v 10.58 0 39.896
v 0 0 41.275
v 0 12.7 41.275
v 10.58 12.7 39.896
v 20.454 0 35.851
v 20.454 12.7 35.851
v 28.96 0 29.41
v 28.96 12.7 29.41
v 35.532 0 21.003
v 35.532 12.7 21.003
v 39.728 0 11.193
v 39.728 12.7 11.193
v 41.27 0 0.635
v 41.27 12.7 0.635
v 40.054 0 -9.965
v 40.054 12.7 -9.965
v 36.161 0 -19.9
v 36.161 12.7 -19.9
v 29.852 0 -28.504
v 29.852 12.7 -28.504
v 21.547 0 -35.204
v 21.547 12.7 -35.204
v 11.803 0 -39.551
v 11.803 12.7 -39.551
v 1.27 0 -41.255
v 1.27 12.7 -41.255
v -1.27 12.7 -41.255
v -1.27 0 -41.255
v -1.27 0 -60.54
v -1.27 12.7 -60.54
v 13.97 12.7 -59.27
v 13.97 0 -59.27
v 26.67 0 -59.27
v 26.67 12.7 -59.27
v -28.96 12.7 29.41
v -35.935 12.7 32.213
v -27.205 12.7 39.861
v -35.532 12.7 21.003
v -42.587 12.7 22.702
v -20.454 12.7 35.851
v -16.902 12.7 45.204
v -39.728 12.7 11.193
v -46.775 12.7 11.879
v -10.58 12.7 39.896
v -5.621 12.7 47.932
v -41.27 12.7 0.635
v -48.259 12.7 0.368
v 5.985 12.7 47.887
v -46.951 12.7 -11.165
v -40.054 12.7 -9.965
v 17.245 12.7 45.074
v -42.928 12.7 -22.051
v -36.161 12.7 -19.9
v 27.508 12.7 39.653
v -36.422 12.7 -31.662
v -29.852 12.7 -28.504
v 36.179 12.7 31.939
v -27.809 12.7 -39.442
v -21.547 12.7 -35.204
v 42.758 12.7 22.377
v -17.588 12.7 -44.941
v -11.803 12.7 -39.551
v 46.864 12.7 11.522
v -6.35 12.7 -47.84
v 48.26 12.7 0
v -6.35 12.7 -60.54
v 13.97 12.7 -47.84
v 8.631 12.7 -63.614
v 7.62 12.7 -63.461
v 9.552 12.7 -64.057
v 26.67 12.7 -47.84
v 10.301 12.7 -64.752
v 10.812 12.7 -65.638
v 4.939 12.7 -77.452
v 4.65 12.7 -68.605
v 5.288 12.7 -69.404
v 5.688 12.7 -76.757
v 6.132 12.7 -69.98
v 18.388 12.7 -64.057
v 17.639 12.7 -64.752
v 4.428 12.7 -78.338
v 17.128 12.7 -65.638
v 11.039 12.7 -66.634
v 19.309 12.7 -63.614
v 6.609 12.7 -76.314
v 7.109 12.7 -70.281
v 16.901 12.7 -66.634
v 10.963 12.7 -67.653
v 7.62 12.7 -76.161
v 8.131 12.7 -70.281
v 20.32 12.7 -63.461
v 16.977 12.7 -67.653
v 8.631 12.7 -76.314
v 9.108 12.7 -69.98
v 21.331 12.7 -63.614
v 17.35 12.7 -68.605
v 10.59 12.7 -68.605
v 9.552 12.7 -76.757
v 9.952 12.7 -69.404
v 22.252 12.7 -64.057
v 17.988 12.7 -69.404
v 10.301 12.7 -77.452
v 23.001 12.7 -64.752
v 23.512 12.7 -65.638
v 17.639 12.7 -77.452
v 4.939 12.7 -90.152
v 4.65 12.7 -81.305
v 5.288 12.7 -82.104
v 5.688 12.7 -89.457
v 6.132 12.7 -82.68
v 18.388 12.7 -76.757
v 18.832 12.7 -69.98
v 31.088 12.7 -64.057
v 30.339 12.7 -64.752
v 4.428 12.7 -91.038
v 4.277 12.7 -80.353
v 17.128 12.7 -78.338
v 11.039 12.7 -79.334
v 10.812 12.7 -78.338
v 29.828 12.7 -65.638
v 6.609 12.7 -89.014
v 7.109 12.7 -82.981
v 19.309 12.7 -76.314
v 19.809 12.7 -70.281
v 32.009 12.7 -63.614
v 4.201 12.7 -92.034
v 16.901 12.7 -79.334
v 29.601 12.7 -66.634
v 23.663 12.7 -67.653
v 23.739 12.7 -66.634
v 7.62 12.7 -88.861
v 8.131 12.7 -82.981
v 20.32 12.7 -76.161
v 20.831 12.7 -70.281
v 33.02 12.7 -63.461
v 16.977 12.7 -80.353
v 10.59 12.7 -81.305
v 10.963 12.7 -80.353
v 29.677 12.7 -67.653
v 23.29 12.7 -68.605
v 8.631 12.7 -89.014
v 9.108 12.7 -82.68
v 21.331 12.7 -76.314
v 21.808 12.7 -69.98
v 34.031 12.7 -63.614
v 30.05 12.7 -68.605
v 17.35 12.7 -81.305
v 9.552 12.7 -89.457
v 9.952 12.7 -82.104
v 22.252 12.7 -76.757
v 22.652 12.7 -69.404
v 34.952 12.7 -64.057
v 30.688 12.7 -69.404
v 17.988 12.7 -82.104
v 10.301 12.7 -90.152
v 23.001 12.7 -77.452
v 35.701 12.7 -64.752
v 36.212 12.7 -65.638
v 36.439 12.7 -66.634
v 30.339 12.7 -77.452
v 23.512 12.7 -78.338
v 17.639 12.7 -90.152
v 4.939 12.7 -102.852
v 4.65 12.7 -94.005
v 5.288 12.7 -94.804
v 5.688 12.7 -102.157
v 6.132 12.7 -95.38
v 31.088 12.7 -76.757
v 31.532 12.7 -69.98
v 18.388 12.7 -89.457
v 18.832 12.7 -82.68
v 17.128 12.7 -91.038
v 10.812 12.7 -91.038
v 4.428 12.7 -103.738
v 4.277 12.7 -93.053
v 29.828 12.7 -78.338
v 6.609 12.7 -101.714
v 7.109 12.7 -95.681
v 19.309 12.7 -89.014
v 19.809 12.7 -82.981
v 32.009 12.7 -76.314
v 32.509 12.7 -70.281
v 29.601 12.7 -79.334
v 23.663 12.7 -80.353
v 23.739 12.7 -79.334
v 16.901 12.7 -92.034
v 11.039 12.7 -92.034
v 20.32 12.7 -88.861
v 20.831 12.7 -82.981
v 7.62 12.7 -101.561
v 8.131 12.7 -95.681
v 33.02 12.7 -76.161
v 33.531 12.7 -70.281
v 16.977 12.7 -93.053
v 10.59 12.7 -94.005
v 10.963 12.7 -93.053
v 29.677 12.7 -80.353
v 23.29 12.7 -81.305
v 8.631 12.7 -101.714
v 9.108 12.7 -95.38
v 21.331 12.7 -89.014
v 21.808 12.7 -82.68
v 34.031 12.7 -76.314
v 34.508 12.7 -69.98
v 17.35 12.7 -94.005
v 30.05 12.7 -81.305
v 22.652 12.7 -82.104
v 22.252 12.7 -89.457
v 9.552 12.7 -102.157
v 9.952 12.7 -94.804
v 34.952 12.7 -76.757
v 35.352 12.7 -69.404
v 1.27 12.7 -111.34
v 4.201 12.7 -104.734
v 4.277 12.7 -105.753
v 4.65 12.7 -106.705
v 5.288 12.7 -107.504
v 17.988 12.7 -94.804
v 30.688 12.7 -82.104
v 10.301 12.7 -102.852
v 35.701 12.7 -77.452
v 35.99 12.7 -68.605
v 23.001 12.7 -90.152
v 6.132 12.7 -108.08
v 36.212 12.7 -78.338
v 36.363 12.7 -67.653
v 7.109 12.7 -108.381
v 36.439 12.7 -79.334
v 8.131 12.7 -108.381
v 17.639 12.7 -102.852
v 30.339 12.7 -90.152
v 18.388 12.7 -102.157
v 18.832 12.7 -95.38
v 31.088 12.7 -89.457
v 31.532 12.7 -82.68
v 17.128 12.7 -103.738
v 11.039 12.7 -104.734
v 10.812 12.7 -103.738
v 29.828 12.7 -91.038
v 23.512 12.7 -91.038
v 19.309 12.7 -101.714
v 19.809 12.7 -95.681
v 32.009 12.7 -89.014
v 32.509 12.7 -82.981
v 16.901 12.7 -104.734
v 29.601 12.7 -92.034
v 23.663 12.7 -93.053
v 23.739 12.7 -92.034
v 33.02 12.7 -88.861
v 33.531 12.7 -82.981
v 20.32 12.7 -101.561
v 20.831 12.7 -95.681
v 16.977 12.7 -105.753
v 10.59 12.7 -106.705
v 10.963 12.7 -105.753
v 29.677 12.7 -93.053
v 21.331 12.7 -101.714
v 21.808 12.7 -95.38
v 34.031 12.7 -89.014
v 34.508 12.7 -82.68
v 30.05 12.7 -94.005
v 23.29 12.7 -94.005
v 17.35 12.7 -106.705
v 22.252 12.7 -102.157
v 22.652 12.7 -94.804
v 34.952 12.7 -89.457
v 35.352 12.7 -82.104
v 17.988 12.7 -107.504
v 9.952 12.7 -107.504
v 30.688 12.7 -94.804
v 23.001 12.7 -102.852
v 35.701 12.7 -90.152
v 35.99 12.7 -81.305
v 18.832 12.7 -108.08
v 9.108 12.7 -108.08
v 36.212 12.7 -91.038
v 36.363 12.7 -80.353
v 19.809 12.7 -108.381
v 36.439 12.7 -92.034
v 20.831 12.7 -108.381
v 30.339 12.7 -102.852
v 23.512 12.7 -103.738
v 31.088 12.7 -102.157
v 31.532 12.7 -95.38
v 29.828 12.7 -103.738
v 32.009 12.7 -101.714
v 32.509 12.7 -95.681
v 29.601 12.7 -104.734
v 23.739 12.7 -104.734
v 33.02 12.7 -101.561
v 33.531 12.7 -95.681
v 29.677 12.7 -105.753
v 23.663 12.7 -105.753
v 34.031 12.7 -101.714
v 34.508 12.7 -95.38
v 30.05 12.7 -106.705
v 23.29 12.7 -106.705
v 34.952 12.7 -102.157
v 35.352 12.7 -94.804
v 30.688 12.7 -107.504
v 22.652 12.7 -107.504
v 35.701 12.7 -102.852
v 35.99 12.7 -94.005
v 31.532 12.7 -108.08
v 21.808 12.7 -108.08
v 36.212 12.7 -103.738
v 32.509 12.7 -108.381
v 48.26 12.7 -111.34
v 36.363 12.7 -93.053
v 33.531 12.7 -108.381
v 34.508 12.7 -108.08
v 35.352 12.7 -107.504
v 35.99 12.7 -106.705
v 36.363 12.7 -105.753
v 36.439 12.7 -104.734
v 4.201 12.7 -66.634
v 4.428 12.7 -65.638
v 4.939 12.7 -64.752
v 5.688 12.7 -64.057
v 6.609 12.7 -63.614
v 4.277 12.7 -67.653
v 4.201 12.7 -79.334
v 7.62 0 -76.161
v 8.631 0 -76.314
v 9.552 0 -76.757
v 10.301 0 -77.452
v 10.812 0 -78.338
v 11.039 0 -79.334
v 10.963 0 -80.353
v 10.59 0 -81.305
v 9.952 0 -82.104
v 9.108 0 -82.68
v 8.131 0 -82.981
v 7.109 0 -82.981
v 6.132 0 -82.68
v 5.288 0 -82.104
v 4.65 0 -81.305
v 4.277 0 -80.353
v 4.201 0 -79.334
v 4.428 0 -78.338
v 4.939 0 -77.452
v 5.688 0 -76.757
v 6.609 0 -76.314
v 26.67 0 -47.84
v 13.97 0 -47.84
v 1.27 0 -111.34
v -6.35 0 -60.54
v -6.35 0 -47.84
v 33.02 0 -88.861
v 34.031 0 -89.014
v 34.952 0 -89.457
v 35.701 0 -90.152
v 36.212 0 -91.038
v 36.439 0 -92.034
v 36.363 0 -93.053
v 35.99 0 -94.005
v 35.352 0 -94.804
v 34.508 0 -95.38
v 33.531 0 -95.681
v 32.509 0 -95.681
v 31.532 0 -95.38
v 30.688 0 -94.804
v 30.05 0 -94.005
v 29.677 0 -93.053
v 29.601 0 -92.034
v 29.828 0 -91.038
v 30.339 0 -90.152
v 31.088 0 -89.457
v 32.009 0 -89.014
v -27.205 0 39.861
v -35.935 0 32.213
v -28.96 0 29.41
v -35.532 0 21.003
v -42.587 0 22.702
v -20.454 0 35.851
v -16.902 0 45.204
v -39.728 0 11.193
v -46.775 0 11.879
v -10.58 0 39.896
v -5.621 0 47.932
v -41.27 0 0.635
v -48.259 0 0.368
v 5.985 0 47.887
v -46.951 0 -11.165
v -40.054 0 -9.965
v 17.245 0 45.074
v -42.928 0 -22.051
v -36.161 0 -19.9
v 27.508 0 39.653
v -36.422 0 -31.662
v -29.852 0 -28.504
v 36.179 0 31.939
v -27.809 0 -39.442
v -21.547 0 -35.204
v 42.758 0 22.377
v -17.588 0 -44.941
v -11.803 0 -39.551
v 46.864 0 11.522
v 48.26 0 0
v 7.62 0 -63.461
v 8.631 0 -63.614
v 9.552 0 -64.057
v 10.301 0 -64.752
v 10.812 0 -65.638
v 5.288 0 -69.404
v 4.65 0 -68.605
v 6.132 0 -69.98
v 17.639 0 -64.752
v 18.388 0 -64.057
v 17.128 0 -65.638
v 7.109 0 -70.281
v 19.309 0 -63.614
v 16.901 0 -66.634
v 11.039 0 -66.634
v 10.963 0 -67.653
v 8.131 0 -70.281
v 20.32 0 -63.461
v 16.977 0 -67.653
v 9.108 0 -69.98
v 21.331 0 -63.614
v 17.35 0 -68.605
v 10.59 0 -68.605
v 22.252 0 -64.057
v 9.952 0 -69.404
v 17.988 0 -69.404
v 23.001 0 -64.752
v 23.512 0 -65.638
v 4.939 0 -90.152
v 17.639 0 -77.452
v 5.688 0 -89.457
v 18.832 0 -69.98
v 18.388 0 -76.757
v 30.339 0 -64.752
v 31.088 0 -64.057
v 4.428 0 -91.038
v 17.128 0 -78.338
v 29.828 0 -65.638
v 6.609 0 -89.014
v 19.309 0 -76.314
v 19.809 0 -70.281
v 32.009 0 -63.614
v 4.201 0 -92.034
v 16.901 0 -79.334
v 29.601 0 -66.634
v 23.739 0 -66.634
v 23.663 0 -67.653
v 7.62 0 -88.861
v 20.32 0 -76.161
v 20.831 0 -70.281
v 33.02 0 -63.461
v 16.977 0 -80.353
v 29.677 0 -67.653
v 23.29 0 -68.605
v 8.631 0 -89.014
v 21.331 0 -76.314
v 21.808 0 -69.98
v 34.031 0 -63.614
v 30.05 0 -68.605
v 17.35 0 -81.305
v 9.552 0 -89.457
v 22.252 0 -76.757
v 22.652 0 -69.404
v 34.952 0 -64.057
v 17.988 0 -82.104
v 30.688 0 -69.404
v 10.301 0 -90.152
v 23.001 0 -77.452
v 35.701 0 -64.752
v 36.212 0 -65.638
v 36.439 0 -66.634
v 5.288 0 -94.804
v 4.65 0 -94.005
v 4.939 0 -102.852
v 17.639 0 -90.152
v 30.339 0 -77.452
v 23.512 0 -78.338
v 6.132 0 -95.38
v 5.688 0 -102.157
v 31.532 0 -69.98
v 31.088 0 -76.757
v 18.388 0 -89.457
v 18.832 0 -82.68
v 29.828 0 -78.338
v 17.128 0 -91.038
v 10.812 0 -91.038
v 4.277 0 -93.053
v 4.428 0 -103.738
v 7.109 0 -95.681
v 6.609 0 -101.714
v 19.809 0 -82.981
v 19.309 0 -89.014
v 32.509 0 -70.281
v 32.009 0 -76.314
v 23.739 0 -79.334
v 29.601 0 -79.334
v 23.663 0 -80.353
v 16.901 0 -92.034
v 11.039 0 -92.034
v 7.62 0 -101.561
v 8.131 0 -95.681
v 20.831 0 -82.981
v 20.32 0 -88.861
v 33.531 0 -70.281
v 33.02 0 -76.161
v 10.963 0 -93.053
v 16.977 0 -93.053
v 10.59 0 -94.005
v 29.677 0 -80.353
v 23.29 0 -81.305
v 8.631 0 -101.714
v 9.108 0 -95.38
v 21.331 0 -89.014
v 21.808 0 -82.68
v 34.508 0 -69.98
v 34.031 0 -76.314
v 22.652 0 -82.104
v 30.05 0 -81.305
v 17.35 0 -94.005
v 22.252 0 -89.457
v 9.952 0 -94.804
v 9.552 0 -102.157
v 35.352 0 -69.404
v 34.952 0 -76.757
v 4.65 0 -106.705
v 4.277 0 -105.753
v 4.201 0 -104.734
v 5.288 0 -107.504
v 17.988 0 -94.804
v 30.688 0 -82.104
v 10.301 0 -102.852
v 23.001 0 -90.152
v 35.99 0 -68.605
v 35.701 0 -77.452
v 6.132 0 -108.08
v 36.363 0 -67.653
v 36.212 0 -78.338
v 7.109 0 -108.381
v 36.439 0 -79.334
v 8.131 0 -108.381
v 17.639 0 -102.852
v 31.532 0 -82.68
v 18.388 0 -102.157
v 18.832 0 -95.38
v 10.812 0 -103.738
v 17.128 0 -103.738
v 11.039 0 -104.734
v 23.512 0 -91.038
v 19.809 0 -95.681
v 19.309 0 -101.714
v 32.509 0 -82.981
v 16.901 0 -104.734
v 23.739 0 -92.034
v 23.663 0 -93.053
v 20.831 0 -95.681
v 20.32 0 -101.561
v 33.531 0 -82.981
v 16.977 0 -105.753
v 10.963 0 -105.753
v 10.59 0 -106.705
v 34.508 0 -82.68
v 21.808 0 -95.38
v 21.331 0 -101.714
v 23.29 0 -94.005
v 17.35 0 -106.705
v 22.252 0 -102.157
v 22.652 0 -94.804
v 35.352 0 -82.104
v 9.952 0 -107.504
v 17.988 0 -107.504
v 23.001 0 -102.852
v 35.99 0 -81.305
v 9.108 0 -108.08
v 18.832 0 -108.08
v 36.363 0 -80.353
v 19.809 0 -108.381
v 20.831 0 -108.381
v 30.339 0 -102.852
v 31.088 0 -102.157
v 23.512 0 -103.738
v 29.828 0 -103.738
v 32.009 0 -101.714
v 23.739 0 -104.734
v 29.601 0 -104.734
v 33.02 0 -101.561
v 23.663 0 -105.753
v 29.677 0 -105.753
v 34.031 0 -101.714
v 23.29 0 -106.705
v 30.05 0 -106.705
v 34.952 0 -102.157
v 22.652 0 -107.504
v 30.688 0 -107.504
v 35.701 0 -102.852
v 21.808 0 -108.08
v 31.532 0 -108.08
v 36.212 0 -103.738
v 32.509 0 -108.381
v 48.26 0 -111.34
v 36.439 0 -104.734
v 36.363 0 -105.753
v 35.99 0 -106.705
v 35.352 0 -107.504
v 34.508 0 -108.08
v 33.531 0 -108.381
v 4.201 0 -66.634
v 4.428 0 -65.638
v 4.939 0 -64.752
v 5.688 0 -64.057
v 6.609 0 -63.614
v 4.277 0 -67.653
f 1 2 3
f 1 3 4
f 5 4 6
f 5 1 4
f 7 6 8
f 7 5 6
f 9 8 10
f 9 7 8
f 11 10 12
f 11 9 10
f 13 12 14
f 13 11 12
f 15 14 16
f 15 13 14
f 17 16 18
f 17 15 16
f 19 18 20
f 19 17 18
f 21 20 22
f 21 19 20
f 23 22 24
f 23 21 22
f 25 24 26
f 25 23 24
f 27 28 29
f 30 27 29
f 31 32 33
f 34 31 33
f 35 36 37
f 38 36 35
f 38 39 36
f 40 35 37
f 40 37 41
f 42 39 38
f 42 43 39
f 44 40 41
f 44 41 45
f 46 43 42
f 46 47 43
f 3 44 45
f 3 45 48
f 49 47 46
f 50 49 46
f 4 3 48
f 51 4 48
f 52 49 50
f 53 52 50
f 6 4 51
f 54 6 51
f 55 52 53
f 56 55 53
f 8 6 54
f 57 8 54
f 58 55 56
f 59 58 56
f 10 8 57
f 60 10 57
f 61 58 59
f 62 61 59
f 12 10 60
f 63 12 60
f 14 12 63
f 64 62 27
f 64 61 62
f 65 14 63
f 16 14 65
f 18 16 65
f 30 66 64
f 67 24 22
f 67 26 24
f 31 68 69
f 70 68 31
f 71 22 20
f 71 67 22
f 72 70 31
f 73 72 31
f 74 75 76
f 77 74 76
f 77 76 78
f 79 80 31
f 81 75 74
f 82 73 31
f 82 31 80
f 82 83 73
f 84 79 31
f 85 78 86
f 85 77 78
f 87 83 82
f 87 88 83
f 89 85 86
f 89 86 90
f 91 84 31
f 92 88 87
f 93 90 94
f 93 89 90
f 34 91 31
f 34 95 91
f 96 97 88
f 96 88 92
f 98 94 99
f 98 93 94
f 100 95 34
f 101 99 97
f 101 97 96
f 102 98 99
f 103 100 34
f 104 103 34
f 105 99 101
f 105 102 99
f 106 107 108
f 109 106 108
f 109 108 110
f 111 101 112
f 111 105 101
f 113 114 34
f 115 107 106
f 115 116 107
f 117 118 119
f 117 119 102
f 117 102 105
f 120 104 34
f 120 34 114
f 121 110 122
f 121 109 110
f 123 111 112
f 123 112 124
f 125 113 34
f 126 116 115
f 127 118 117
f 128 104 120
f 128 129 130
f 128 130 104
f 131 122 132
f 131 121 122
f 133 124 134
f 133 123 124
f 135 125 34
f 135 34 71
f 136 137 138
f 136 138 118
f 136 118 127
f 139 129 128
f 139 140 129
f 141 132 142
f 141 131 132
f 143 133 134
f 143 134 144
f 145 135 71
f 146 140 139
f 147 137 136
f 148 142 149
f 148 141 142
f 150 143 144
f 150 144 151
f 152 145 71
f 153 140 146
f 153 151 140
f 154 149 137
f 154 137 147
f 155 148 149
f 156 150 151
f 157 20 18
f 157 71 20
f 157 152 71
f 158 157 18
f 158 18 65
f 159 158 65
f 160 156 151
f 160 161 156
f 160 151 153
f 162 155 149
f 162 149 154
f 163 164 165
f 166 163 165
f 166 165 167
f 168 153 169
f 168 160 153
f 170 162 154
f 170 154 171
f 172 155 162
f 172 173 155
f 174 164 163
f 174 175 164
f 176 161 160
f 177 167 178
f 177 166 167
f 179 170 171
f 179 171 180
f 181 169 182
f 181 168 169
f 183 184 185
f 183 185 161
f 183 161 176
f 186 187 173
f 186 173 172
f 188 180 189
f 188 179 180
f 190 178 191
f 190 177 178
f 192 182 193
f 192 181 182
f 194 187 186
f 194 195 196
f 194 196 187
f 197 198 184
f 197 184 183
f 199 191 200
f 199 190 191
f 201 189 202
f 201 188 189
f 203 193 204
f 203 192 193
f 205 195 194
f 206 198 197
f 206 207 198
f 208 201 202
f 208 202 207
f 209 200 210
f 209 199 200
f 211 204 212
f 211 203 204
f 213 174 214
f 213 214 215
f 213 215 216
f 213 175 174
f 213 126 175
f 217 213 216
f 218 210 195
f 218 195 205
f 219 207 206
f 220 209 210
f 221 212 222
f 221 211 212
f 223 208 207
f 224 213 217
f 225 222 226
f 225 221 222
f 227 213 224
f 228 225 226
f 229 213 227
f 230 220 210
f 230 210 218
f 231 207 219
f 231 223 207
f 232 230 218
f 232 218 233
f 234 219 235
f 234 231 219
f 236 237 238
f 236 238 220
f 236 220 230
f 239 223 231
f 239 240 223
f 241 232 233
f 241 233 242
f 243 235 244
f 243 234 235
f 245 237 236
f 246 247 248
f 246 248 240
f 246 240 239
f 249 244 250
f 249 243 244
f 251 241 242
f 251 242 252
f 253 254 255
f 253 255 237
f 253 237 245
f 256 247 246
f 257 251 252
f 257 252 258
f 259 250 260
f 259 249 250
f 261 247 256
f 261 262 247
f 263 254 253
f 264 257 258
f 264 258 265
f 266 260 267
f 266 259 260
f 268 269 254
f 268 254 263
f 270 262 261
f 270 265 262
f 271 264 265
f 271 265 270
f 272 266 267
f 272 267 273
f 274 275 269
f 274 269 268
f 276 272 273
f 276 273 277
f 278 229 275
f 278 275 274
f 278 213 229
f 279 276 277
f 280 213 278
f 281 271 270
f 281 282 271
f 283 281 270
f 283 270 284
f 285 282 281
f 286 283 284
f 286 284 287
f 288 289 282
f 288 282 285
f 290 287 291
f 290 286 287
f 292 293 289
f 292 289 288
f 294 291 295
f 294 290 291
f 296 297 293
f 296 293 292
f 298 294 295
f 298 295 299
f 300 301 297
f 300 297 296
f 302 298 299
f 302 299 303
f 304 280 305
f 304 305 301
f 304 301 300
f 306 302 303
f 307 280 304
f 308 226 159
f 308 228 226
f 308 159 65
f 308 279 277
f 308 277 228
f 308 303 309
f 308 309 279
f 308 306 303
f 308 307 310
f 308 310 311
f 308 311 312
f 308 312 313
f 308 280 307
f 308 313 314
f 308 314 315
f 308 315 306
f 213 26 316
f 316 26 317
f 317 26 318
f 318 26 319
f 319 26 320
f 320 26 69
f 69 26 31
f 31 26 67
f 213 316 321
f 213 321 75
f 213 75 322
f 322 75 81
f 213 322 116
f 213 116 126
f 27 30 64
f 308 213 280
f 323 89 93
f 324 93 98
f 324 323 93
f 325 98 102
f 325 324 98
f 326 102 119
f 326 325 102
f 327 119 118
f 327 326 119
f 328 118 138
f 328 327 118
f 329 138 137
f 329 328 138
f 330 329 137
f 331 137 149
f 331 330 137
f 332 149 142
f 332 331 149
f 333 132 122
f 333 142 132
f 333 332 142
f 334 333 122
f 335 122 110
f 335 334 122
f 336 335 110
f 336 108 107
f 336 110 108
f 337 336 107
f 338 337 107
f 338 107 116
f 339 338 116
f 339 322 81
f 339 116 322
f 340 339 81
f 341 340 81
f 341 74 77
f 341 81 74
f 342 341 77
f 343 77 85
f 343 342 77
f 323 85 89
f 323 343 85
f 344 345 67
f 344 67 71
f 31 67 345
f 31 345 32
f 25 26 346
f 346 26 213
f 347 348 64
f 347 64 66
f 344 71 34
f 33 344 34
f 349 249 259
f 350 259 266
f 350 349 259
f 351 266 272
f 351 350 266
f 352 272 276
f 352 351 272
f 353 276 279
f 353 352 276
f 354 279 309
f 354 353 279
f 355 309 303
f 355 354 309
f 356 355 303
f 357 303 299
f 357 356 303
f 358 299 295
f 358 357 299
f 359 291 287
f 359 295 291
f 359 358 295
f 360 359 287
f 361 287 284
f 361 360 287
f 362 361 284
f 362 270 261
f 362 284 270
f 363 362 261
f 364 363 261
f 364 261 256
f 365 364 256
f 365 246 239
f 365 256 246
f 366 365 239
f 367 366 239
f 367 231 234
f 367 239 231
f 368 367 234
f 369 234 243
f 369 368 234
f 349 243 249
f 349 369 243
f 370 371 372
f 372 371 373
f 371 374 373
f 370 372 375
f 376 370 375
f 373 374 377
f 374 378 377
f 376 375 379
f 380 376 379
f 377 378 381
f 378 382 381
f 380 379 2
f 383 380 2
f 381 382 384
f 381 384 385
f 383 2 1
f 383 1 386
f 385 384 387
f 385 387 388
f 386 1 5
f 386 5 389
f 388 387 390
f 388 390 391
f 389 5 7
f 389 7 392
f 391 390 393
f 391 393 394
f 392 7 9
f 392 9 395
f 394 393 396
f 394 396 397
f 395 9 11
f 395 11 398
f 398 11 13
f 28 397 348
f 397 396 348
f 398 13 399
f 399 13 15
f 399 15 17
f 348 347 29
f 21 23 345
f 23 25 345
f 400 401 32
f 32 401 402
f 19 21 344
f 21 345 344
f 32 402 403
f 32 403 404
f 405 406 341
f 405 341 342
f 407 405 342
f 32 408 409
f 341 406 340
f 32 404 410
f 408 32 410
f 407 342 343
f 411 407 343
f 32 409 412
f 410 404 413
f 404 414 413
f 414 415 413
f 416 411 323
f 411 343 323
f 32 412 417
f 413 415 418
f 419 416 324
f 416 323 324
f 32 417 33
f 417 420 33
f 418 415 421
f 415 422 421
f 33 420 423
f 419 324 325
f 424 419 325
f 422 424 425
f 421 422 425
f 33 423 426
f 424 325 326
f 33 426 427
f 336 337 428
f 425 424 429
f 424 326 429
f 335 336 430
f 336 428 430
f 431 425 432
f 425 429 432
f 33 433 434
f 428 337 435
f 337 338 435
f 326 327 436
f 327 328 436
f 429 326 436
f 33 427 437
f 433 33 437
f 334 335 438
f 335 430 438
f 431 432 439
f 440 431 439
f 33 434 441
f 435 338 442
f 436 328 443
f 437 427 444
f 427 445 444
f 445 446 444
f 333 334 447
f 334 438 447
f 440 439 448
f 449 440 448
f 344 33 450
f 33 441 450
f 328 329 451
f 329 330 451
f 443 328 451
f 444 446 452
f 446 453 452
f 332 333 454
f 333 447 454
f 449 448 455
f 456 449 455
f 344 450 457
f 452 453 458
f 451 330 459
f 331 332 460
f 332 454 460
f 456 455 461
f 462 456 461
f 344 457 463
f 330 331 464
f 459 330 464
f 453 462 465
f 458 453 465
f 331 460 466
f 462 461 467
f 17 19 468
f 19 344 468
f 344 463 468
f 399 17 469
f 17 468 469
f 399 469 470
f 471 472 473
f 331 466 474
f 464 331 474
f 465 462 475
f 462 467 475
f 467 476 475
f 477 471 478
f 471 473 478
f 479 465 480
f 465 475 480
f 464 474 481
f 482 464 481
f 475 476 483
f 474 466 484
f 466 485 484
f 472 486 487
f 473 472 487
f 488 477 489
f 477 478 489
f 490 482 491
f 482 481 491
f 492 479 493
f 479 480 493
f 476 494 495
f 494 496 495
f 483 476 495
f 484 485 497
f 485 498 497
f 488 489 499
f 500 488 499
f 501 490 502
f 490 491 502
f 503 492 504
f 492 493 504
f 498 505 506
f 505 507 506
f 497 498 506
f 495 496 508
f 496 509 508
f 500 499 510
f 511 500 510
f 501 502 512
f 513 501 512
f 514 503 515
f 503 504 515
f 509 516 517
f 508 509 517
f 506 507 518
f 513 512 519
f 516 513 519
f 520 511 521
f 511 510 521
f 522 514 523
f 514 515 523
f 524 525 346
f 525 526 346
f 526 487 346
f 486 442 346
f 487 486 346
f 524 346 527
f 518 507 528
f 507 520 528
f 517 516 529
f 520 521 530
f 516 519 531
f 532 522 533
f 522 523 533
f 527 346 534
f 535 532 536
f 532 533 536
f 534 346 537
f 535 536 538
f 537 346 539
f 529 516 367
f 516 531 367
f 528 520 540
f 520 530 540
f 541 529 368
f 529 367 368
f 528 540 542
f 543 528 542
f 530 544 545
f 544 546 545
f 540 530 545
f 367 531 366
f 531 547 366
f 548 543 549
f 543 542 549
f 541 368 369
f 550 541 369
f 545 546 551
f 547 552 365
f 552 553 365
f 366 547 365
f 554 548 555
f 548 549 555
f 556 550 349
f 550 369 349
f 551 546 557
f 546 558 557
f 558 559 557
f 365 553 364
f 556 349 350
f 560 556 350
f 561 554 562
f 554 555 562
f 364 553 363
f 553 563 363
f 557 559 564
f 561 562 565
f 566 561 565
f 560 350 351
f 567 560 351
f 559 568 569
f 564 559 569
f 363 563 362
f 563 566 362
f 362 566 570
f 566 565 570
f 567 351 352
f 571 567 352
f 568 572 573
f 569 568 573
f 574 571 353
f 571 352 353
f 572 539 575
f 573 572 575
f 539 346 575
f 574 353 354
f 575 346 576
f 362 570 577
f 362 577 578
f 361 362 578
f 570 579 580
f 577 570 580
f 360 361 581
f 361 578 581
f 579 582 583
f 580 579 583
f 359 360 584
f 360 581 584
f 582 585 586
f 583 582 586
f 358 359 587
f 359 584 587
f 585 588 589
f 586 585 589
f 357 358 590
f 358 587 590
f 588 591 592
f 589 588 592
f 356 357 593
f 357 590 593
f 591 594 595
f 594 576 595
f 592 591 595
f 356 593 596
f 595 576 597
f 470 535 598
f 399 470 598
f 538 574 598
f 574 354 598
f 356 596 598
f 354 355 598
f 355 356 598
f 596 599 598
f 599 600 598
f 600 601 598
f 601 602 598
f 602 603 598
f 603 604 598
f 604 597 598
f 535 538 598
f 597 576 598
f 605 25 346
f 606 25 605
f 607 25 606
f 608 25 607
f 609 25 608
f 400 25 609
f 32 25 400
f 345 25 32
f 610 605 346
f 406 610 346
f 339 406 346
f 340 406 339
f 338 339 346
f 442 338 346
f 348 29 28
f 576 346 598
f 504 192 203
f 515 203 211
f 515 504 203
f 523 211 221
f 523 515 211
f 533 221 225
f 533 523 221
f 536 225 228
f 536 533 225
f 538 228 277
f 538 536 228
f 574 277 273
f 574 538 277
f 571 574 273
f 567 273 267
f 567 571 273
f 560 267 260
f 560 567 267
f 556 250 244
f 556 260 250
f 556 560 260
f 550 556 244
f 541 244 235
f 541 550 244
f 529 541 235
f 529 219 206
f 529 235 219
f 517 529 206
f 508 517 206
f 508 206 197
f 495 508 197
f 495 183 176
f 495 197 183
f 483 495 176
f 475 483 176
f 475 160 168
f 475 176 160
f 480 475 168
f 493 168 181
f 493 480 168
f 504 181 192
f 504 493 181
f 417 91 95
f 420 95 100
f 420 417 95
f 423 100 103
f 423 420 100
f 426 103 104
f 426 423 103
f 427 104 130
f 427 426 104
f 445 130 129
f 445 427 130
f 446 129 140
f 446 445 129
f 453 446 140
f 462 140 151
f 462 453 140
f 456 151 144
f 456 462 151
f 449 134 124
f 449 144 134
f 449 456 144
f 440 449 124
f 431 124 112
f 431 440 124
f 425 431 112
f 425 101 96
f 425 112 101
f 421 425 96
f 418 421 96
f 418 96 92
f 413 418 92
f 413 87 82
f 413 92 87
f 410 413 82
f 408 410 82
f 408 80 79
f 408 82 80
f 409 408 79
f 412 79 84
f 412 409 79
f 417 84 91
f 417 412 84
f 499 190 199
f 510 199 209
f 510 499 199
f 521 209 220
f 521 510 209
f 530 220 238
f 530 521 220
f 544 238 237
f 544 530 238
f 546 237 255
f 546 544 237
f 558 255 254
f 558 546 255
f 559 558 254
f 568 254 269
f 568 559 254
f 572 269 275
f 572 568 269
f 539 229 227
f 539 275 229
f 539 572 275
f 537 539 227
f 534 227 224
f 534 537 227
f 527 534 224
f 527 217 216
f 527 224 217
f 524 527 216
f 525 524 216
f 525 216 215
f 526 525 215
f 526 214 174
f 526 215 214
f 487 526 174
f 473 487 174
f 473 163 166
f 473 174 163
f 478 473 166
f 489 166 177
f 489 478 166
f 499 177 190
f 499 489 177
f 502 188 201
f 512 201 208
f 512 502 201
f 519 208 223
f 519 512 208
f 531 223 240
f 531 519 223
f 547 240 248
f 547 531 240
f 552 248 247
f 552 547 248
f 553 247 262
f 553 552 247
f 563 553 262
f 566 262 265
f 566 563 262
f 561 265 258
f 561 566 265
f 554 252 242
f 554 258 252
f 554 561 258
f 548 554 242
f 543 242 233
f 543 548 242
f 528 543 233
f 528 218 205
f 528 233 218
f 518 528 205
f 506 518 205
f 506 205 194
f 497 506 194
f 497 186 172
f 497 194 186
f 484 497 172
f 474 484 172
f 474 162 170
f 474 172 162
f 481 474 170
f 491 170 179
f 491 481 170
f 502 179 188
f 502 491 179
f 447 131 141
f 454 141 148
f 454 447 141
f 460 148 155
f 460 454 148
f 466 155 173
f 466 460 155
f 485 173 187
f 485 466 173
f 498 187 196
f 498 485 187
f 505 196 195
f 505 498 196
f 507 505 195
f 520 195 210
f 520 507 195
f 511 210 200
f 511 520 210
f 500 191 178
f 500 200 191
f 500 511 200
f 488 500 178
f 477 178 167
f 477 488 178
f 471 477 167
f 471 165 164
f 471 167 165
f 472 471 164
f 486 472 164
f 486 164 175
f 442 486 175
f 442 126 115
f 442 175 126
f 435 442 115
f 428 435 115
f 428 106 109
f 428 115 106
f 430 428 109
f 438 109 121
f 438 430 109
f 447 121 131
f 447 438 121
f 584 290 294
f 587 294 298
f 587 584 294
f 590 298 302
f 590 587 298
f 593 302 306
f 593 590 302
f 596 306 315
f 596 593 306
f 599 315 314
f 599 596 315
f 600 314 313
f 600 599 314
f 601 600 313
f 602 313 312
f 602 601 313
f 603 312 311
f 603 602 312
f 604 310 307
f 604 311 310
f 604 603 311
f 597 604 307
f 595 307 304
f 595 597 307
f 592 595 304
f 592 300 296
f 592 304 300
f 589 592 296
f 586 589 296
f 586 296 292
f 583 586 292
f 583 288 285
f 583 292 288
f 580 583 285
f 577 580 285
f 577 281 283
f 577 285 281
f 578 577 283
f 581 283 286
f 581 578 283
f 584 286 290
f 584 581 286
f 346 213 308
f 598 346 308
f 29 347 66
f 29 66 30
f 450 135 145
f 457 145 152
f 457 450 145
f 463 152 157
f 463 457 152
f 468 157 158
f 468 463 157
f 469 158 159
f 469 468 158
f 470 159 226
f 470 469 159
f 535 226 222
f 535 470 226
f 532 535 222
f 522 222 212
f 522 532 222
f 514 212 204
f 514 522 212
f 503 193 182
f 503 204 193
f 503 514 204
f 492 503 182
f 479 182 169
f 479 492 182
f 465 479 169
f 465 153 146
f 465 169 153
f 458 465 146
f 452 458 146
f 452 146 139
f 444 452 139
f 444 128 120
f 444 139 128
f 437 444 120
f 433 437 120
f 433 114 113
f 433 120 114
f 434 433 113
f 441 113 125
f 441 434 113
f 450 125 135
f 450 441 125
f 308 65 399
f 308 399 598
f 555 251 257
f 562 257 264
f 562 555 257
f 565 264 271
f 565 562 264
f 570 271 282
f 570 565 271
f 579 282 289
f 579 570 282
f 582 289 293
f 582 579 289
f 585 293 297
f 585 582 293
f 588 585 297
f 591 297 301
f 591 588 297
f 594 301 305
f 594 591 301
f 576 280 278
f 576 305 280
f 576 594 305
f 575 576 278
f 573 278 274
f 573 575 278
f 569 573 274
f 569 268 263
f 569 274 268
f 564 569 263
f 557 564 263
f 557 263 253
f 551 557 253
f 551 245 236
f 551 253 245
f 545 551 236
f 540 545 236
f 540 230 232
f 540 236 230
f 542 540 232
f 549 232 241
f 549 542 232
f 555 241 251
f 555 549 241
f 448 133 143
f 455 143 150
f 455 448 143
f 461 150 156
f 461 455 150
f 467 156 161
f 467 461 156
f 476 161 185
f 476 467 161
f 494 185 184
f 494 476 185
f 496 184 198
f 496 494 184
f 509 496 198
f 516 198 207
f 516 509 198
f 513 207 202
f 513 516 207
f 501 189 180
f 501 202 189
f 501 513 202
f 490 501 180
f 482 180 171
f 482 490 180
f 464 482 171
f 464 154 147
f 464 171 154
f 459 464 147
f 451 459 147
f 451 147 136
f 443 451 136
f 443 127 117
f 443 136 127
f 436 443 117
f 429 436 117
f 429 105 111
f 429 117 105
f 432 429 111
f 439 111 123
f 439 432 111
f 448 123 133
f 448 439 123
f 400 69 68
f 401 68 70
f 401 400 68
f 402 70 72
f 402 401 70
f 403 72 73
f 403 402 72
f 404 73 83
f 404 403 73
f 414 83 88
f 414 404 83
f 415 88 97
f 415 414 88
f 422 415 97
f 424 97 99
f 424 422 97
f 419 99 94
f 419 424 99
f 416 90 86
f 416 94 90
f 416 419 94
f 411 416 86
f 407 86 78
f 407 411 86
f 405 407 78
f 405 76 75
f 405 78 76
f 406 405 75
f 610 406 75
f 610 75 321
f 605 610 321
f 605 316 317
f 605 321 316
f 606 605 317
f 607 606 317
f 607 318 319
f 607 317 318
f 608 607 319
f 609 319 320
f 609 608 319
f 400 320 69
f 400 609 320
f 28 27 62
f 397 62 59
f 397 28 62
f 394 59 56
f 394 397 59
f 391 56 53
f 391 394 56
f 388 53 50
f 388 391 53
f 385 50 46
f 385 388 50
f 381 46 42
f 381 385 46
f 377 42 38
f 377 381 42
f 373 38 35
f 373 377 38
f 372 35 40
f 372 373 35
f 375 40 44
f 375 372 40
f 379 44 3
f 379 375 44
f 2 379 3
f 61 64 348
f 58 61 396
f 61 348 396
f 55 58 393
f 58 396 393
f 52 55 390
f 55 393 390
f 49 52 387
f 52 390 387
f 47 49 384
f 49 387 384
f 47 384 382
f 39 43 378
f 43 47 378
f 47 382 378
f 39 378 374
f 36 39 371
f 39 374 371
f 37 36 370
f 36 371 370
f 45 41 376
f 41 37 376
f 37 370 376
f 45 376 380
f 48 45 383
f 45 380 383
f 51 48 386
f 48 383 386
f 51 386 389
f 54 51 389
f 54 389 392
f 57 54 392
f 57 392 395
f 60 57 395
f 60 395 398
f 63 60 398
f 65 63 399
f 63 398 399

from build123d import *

# Parameters (mm, degrees)
SKETCH1_R           = 48.26
SKETCH1_R_2         = 41.275
BOSS_EXTRUDE1_DEPTH = 12.7
SKETCH2_W           = 12.7
SKETCH2_H           = 12.7
BOSS_EXTRUDE2_DEPTH = 12.7
SKETCH4_W           = 2.54
SKETCH4_H           = 44.098902666
CUT_EXTRUDE2_DEPTH  = 79.456734484
BOSS_EXTRUDE3_REACH = 128.717
BOSS_EXTRUDE3_START = 48.26
SKETCH5_W           = 60.540412833
SKETCH5_H           = 12.7
SKETCH6_W           = 46.99
SKETCH6_H           = 50.8
BOSS_EXTRUDE4_DEPTH = 12.7
SKETCH7_R           = 3.429
SKETCH7_W           = 12.7
SKETCH7_H           = 11.43
CUT_EXTRUDE3_DEPTH  = 123.012315484


with BuildPart() as part:
    # Sketch1 → Boss-Extrude1 (new body)
    with BuildSketch(Plane(origin=(0, 0, 0), x_dir=(1, 0, 0), z_dir=(0, 1, 0))):
        with Locations(Location((0, 0, 0), (0, 0, 270))):
            Circle(SKETCH1_R)
        with Locations(Location((0, 0, 0), (0, 0, 270))):
            Circle(SKETCH1_R_2, mode=Mode.SUBTRACT)
    extrude(amount=BOSS_EXTRUDE1_DEPTH)

    # Sketch2 → Boss-Extrude2 (add)
    with BuildSketch(Plane(origin=(0, 0, 0), x_dir=(1, 0, 0), z_dir=(0, 1, 0))):
        with Locations((0, 54.190412833)):
            Rectangle(SKETCH2_W, SKETCH2_H)
    extrude(amount=BOSS_EXTRUDE2_DEPTH)

    # Sketch4 → Cut-Extrude2 (cut, through all)
    with BuildSketch(Plane(origin=(0, 0, 0), x_dir=(1, 0, 0), z_dir=(0, 1, 0))):
        with Locations((0, 60.121342859)):
            Rectangle(SKETCH4_W, SKETCH4_H)
    extrude(amount=CUT_EXTRUDE2_DEPTH, mode=Mode.SUBTRACT)

    # Sketch5 → Boss-Extrude3 (add, up to next)
    with BuildSketch(Plane(origin=(0, 0, 0), x_dir=(0, 0, -1), z_dir=(1, 0, 0)).offset(BOSS_EXTRUDE3_START), mode=Mode.PRIVATE) as boss_extrude3_sk1:
        with Locations((30.270206417, 6.35)):
            Rectangle(SKETCH5_W, SKETCH5_H)
    boss_extrude3_tool1 = extrude(boss_extrude3_sk1.sketch, amount=-BOSS_EXTRUDE3_REACH, mode=Mode.PRIVATE) - part.part
    add(boss_extrude3_tool1.solids().sort_by_distance((48.26, 6.35, -30.270206))[0])

    # Sketch6 → Boss-Extrude4 (add)
    with BuildSketch(Plane(origin=(0, 12.7, 0), x_dir=(1, 0, 0), z_dir=(0, 1, 0))):
        with Locations((24.765, 85.940412833)):
            Rectangle(SKETCH6_W, SKETCH6_H)
    extrude(amount=-BOSS_EXTRUDE4_DEPTH)

    # Sketch7 → Cut-Extrude3 (cut, through all)
    with BuildSketch(Plane(origin=(0, 0, 0), x_dir=(1, 0, 0), z_dir=(0, 1, 0))):
        with Locations(Location((7.62, 104.990412833, 0), (0, 0, 270))):
            Circle(SKETCH7_R)
        with Locations(Location((20.32, 104.990412833, 0), (0, 0, 270))):
            Circle(SKETCH7_R)
        with Locations(Location((20.32, 92.290412833, 0), (0, 0, 270))):
            Circle(SKETCH7_R)
        with Locations(Location((7.62, 92.290412833, 0), (0, 0, 270))):
            Circle(SKETCH7_R)
        with Locations(Location((7.62, 79.590412833, 0), (0, 0, 270))):
            Circle(SKETCH7_R)
        with Locations(Location((20.32, 79.590412833, 0), (0, 0, 270))):
            Circle(SKETCH7_R)
        with Locations(Location((7.62, 66.890412833, 0), (0, 0, 270))):
            Circle(SKETCH7_R)
        with Locations(Location((20.32, 66.890412833, 0), (0, 0, 270))):
            Circle(SKETCH7_R)
        with Locations(Location((33.02, 104.990412833, 0), (0, 0, 270))):
            Circle(SKETCH7_R)
        with Locations(Location((33.02, 92.290412833, 0), (0, 0, 270))):
            Circle(SKETCH7_R)
        with Locations(Location((33.02, 79.590412833, 0), (0, 0, 270))):
            Circle(SKETCH7_R)
        with Locations(Location((33.02, 66.890412833, 0), (0, 0, 270))):
            Circle(SKETCH7_R)
        with Locations((20.32, 53.555412833)):
            Rectangle(SKETCH7_W, SKETCH7_H)
    extrude(amount=CUT_EXTRUDE3_DEPTH, mode=Mode.SUBTRACT)


solid = part.part
